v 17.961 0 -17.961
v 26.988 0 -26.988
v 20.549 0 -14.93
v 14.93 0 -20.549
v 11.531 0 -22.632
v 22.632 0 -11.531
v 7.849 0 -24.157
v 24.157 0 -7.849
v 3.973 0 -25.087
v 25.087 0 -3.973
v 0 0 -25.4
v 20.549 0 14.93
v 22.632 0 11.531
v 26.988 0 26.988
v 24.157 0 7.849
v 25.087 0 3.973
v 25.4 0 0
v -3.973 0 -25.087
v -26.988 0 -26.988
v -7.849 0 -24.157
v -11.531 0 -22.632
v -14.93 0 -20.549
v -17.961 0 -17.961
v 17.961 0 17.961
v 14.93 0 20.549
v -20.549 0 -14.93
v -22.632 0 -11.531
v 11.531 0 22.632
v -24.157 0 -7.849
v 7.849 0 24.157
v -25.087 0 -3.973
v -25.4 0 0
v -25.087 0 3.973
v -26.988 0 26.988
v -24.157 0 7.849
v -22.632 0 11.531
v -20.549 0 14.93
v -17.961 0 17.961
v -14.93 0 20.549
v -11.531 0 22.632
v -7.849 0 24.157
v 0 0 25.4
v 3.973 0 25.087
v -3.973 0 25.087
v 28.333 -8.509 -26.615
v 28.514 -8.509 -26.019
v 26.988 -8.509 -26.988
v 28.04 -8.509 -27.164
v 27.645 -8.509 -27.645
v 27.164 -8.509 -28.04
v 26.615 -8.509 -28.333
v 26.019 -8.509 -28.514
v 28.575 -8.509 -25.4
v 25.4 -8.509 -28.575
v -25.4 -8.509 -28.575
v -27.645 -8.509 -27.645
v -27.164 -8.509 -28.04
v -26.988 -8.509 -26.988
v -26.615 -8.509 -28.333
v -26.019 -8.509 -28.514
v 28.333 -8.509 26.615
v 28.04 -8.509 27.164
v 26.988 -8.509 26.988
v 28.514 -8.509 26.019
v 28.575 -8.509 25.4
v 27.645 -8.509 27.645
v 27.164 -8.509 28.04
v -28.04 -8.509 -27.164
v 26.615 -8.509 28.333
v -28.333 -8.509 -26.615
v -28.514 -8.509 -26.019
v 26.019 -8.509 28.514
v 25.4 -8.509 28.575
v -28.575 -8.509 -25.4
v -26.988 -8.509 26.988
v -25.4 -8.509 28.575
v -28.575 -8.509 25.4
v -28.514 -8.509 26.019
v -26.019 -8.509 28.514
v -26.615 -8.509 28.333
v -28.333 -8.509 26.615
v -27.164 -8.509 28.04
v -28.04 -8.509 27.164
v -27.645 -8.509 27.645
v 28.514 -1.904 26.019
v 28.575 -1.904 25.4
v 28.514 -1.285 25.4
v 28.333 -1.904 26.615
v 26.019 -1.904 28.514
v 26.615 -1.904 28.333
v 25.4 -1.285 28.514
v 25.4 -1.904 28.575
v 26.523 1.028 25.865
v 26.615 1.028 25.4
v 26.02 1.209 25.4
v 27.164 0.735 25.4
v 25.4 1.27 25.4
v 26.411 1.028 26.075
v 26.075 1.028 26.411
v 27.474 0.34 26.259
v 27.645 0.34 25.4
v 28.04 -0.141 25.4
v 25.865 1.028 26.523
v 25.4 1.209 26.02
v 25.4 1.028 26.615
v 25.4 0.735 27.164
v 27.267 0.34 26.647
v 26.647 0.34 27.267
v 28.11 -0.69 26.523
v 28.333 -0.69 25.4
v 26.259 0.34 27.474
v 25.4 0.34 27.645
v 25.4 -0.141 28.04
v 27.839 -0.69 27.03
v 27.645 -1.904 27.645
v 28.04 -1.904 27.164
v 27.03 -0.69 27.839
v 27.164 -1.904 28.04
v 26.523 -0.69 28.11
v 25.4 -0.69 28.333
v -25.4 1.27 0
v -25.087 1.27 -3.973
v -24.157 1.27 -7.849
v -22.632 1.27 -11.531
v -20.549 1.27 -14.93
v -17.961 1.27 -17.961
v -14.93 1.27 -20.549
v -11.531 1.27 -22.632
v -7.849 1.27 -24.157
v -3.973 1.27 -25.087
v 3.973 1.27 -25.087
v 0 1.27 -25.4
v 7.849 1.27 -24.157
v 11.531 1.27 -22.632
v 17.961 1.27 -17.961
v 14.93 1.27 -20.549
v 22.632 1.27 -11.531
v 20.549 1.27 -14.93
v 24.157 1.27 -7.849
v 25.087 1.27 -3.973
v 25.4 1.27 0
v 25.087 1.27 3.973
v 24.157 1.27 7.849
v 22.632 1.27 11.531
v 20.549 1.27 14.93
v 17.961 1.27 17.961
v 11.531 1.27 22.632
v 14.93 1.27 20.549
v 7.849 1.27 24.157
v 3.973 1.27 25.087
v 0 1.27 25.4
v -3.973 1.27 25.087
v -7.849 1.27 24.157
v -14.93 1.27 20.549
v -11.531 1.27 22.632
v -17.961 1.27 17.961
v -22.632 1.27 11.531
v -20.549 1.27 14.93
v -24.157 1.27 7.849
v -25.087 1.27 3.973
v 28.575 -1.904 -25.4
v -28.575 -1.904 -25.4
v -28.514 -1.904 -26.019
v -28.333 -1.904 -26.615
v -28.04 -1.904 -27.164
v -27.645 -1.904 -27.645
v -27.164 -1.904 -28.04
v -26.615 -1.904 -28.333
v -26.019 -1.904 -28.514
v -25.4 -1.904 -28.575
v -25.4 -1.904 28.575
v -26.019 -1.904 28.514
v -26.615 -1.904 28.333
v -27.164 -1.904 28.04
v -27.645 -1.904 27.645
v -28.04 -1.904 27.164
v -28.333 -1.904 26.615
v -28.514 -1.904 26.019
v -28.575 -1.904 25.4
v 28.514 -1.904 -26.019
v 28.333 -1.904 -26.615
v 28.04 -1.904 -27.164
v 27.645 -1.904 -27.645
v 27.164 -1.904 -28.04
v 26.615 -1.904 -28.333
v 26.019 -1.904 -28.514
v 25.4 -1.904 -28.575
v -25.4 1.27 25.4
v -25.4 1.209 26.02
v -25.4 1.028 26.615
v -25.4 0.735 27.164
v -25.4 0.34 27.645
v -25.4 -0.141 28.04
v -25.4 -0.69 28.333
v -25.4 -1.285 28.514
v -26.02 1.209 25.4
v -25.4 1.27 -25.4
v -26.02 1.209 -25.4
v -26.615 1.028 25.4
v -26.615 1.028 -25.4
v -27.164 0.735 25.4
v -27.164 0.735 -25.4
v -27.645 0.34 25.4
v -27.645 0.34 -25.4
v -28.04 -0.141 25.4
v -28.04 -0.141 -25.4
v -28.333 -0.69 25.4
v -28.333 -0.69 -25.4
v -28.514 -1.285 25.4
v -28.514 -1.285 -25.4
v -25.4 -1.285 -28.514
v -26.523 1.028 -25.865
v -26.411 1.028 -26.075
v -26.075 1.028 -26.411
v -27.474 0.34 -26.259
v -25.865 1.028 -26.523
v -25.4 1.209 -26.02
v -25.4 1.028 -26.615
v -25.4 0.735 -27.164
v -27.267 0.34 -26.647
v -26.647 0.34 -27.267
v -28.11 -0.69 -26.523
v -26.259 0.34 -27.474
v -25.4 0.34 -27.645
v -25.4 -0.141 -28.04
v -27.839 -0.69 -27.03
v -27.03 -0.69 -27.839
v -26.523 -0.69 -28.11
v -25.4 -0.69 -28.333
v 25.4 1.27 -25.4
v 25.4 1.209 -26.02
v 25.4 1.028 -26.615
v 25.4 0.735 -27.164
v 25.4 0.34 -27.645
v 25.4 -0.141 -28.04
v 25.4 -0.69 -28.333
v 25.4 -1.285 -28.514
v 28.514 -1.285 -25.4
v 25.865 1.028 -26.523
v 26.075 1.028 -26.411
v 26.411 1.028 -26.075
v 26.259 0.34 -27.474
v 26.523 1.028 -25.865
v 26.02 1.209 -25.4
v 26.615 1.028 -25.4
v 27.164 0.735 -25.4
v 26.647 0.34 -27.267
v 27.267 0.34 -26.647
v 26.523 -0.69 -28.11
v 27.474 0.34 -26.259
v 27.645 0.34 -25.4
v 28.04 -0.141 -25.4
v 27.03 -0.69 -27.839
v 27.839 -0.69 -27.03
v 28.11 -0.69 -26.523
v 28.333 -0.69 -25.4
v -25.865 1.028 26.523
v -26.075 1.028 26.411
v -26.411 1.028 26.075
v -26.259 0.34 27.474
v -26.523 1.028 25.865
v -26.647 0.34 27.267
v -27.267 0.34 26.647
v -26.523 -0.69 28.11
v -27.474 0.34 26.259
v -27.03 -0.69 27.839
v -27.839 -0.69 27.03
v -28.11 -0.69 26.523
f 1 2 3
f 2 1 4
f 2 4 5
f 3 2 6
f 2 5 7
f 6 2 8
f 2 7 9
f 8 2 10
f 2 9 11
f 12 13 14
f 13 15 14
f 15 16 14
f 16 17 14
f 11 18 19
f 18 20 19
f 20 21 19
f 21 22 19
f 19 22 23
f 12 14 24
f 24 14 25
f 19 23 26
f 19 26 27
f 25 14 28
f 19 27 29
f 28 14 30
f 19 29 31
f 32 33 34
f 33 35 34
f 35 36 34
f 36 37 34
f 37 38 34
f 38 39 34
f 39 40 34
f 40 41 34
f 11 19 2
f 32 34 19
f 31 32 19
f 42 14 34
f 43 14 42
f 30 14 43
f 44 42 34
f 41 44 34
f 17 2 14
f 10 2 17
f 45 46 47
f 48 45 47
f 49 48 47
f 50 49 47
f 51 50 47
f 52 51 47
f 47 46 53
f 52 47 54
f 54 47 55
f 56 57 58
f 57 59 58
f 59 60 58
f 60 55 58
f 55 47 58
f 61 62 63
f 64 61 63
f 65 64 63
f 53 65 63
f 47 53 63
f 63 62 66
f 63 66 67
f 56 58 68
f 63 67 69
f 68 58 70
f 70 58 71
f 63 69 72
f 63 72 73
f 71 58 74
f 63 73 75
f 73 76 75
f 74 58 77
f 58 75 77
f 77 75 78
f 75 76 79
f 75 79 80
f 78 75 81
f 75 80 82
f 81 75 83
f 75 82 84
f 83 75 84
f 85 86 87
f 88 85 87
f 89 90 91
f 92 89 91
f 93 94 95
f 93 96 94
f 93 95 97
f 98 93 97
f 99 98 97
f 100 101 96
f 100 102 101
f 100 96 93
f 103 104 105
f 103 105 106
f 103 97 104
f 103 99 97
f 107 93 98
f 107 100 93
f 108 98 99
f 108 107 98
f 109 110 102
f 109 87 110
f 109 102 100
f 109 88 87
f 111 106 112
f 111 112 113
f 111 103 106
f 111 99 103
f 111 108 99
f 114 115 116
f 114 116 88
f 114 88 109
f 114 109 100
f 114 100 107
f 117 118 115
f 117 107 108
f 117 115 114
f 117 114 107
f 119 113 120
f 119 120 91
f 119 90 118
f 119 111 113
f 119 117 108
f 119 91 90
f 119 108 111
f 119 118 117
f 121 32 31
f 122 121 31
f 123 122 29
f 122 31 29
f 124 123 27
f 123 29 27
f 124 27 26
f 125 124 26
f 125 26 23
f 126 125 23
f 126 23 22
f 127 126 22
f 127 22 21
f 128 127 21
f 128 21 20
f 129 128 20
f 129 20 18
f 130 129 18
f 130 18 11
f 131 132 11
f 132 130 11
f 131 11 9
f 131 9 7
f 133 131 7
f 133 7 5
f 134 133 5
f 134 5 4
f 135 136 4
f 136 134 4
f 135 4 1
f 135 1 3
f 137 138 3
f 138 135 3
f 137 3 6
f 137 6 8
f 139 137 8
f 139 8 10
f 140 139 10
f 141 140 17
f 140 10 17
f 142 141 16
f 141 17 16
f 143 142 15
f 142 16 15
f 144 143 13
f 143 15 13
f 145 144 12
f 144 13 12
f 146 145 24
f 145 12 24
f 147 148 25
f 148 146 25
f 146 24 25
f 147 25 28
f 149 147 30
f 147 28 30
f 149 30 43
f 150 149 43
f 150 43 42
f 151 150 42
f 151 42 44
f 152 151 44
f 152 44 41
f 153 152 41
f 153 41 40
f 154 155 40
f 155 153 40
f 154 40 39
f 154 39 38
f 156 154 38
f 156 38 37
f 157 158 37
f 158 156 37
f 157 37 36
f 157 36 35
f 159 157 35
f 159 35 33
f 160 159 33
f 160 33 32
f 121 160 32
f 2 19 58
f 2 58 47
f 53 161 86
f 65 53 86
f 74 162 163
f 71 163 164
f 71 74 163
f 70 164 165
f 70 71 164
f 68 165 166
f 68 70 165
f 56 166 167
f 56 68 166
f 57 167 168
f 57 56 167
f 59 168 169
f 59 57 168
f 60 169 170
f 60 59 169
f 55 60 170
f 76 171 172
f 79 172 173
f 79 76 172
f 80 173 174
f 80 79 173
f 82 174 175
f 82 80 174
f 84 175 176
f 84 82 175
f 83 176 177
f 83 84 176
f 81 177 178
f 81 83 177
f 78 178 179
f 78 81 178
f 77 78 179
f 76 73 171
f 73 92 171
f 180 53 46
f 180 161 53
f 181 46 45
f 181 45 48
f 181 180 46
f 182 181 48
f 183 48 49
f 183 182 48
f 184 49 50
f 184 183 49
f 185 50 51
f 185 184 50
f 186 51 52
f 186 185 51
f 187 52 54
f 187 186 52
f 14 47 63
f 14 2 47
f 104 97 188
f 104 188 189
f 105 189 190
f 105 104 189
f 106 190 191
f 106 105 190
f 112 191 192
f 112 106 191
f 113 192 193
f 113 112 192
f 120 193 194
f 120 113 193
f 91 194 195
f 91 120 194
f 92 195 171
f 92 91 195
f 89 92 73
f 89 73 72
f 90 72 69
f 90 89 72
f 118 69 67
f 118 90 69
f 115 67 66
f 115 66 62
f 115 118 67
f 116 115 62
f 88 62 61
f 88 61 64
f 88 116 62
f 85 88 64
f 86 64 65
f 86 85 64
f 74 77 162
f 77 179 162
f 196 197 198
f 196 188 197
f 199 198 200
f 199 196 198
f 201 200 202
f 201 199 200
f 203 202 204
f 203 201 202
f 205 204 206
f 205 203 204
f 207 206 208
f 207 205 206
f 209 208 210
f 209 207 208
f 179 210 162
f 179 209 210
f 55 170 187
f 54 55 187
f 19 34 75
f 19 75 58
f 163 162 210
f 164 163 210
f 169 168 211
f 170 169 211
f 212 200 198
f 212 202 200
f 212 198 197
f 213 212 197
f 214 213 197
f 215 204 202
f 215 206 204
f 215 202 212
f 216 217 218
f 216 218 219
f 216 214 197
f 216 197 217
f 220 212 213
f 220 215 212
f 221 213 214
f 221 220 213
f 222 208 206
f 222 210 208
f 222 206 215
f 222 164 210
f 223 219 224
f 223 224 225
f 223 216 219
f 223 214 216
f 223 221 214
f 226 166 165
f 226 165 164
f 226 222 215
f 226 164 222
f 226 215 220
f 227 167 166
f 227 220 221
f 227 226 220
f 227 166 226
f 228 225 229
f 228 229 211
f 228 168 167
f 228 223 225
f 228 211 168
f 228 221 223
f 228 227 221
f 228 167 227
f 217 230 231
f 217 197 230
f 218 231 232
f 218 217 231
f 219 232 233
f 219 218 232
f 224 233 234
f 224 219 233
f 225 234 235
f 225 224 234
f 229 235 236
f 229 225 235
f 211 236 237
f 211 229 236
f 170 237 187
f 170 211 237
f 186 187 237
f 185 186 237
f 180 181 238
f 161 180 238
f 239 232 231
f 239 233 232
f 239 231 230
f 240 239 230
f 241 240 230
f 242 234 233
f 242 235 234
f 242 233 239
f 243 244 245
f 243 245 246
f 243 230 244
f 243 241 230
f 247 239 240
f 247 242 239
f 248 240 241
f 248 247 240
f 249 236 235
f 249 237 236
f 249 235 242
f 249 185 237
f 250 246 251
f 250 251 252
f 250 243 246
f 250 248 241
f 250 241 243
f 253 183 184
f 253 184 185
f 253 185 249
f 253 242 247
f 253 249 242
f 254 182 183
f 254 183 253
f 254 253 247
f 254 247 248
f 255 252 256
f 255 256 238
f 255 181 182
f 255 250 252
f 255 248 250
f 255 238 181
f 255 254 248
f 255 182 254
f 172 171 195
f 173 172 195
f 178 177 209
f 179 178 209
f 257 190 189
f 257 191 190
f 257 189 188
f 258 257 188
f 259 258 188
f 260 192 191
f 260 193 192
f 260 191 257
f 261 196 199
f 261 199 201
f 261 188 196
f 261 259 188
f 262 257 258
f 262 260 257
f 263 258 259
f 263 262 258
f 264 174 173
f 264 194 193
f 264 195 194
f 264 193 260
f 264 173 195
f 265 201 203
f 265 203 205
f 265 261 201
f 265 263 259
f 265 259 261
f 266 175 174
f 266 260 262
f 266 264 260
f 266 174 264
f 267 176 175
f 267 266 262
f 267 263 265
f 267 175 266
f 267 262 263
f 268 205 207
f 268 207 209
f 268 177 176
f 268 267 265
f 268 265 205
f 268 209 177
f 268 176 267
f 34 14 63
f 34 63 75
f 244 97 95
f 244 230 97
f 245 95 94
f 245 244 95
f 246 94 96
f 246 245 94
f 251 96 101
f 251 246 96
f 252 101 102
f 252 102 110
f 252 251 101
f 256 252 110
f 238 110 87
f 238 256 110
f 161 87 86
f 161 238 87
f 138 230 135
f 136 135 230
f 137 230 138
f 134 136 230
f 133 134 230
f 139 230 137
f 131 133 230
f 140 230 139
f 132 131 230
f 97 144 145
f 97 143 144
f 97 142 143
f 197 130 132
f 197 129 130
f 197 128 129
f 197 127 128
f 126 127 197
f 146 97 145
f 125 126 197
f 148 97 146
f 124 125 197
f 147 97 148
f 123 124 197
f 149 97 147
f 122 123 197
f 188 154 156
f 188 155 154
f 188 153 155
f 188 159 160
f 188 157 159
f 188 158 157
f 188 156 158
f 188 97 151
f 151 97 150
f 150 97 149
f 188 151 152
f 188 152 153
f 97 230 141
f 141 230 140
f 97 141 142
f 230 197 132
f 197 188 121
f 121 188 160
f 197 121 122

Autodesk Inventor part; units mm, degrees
ref_plane "YZ Plane" through (0, 0, 0) normal (1, 0, 0) x (0, 1, 0)
ref_plane "XZ Plane" through (0, 0, 0) normal (0, 1, 0) x (-1, 0, 0)
ref_plane "XY Plane" through (0, 0, 0) normal (0, 0, 1) x (1, 0, 0)
sketch "Sketch1" plane through (0, 0, 0) normal (0, 1, 0) x (-1, 0, 0)
  circle A0 centre (0, 0) radius 25.4
  line L0 (-28.575, 28.575) -> (28.575, 28.575)
  line L1 (28.575, 28.575) -> (28.575, -28.575)
  line L2 (28.575, -28.575) -> (-28.575, -28.575)
  line L3 (-28.575, -28.575) -> (-28.575, 28.575)
  line L4 (-28.575, 28.575) -> (28.575, -28.575) construction
  line L5 (28.575, 28.575) -> (-28.575, -28.575) construction
  line L6 (-26.9875, 26.9875) -> (26.9875, 26.9875)
  line L7 (26.9875, 26.9875) -> (26.9875, -26.9875)
  line L8 (26.9875, -26.9875) -> (-26.9875, -26.9875)
  line L9 (-26.9875, -26.9875) -> (-26.9875, 26.9875)
  line L10 (-26.9875, 26.9875) -> (26.9875, -26.9875) construction
  line L11 (26.9875, 26.9875) -> (-26.9875, -26.9875) construction
  dimension "d0" = 50.8
  dimension "d2" = 28.575
  dimension "d7" = 26.9875
extrude "Extrusion1" add sketch "Sketch1" against normal blind 8.509 contours L0 L1 L2 L3
extrude "Extrusion2" add sketch "Sketch1" along normal blind 1.27 contours L0 L1 L2 L3 | L6 L7 L8 L9
fillet "Fillet1" radius 3.175 4 edges at (-28.575, -3.6195, -28.575) (28.575, -3.6195, -28.575) (28.575, -3.6195, 28.575) (-28.575, -3.6195, 28.575)
fillet "Fillet2" radius 3.175 8 edges at (27.6451, 1.27, -27.6451) (0, 1.27, -28.575) (-27.6451, 1.27, -27.6451) (-28.575, 1.27, 0) (-27.6451, 1.27, 27.6451) (0, 1.27, 28.575) (27.6451, 1.27, 27.6451) (28.575, 1.27, 0)
properties part number "TrackDisplayTop"
